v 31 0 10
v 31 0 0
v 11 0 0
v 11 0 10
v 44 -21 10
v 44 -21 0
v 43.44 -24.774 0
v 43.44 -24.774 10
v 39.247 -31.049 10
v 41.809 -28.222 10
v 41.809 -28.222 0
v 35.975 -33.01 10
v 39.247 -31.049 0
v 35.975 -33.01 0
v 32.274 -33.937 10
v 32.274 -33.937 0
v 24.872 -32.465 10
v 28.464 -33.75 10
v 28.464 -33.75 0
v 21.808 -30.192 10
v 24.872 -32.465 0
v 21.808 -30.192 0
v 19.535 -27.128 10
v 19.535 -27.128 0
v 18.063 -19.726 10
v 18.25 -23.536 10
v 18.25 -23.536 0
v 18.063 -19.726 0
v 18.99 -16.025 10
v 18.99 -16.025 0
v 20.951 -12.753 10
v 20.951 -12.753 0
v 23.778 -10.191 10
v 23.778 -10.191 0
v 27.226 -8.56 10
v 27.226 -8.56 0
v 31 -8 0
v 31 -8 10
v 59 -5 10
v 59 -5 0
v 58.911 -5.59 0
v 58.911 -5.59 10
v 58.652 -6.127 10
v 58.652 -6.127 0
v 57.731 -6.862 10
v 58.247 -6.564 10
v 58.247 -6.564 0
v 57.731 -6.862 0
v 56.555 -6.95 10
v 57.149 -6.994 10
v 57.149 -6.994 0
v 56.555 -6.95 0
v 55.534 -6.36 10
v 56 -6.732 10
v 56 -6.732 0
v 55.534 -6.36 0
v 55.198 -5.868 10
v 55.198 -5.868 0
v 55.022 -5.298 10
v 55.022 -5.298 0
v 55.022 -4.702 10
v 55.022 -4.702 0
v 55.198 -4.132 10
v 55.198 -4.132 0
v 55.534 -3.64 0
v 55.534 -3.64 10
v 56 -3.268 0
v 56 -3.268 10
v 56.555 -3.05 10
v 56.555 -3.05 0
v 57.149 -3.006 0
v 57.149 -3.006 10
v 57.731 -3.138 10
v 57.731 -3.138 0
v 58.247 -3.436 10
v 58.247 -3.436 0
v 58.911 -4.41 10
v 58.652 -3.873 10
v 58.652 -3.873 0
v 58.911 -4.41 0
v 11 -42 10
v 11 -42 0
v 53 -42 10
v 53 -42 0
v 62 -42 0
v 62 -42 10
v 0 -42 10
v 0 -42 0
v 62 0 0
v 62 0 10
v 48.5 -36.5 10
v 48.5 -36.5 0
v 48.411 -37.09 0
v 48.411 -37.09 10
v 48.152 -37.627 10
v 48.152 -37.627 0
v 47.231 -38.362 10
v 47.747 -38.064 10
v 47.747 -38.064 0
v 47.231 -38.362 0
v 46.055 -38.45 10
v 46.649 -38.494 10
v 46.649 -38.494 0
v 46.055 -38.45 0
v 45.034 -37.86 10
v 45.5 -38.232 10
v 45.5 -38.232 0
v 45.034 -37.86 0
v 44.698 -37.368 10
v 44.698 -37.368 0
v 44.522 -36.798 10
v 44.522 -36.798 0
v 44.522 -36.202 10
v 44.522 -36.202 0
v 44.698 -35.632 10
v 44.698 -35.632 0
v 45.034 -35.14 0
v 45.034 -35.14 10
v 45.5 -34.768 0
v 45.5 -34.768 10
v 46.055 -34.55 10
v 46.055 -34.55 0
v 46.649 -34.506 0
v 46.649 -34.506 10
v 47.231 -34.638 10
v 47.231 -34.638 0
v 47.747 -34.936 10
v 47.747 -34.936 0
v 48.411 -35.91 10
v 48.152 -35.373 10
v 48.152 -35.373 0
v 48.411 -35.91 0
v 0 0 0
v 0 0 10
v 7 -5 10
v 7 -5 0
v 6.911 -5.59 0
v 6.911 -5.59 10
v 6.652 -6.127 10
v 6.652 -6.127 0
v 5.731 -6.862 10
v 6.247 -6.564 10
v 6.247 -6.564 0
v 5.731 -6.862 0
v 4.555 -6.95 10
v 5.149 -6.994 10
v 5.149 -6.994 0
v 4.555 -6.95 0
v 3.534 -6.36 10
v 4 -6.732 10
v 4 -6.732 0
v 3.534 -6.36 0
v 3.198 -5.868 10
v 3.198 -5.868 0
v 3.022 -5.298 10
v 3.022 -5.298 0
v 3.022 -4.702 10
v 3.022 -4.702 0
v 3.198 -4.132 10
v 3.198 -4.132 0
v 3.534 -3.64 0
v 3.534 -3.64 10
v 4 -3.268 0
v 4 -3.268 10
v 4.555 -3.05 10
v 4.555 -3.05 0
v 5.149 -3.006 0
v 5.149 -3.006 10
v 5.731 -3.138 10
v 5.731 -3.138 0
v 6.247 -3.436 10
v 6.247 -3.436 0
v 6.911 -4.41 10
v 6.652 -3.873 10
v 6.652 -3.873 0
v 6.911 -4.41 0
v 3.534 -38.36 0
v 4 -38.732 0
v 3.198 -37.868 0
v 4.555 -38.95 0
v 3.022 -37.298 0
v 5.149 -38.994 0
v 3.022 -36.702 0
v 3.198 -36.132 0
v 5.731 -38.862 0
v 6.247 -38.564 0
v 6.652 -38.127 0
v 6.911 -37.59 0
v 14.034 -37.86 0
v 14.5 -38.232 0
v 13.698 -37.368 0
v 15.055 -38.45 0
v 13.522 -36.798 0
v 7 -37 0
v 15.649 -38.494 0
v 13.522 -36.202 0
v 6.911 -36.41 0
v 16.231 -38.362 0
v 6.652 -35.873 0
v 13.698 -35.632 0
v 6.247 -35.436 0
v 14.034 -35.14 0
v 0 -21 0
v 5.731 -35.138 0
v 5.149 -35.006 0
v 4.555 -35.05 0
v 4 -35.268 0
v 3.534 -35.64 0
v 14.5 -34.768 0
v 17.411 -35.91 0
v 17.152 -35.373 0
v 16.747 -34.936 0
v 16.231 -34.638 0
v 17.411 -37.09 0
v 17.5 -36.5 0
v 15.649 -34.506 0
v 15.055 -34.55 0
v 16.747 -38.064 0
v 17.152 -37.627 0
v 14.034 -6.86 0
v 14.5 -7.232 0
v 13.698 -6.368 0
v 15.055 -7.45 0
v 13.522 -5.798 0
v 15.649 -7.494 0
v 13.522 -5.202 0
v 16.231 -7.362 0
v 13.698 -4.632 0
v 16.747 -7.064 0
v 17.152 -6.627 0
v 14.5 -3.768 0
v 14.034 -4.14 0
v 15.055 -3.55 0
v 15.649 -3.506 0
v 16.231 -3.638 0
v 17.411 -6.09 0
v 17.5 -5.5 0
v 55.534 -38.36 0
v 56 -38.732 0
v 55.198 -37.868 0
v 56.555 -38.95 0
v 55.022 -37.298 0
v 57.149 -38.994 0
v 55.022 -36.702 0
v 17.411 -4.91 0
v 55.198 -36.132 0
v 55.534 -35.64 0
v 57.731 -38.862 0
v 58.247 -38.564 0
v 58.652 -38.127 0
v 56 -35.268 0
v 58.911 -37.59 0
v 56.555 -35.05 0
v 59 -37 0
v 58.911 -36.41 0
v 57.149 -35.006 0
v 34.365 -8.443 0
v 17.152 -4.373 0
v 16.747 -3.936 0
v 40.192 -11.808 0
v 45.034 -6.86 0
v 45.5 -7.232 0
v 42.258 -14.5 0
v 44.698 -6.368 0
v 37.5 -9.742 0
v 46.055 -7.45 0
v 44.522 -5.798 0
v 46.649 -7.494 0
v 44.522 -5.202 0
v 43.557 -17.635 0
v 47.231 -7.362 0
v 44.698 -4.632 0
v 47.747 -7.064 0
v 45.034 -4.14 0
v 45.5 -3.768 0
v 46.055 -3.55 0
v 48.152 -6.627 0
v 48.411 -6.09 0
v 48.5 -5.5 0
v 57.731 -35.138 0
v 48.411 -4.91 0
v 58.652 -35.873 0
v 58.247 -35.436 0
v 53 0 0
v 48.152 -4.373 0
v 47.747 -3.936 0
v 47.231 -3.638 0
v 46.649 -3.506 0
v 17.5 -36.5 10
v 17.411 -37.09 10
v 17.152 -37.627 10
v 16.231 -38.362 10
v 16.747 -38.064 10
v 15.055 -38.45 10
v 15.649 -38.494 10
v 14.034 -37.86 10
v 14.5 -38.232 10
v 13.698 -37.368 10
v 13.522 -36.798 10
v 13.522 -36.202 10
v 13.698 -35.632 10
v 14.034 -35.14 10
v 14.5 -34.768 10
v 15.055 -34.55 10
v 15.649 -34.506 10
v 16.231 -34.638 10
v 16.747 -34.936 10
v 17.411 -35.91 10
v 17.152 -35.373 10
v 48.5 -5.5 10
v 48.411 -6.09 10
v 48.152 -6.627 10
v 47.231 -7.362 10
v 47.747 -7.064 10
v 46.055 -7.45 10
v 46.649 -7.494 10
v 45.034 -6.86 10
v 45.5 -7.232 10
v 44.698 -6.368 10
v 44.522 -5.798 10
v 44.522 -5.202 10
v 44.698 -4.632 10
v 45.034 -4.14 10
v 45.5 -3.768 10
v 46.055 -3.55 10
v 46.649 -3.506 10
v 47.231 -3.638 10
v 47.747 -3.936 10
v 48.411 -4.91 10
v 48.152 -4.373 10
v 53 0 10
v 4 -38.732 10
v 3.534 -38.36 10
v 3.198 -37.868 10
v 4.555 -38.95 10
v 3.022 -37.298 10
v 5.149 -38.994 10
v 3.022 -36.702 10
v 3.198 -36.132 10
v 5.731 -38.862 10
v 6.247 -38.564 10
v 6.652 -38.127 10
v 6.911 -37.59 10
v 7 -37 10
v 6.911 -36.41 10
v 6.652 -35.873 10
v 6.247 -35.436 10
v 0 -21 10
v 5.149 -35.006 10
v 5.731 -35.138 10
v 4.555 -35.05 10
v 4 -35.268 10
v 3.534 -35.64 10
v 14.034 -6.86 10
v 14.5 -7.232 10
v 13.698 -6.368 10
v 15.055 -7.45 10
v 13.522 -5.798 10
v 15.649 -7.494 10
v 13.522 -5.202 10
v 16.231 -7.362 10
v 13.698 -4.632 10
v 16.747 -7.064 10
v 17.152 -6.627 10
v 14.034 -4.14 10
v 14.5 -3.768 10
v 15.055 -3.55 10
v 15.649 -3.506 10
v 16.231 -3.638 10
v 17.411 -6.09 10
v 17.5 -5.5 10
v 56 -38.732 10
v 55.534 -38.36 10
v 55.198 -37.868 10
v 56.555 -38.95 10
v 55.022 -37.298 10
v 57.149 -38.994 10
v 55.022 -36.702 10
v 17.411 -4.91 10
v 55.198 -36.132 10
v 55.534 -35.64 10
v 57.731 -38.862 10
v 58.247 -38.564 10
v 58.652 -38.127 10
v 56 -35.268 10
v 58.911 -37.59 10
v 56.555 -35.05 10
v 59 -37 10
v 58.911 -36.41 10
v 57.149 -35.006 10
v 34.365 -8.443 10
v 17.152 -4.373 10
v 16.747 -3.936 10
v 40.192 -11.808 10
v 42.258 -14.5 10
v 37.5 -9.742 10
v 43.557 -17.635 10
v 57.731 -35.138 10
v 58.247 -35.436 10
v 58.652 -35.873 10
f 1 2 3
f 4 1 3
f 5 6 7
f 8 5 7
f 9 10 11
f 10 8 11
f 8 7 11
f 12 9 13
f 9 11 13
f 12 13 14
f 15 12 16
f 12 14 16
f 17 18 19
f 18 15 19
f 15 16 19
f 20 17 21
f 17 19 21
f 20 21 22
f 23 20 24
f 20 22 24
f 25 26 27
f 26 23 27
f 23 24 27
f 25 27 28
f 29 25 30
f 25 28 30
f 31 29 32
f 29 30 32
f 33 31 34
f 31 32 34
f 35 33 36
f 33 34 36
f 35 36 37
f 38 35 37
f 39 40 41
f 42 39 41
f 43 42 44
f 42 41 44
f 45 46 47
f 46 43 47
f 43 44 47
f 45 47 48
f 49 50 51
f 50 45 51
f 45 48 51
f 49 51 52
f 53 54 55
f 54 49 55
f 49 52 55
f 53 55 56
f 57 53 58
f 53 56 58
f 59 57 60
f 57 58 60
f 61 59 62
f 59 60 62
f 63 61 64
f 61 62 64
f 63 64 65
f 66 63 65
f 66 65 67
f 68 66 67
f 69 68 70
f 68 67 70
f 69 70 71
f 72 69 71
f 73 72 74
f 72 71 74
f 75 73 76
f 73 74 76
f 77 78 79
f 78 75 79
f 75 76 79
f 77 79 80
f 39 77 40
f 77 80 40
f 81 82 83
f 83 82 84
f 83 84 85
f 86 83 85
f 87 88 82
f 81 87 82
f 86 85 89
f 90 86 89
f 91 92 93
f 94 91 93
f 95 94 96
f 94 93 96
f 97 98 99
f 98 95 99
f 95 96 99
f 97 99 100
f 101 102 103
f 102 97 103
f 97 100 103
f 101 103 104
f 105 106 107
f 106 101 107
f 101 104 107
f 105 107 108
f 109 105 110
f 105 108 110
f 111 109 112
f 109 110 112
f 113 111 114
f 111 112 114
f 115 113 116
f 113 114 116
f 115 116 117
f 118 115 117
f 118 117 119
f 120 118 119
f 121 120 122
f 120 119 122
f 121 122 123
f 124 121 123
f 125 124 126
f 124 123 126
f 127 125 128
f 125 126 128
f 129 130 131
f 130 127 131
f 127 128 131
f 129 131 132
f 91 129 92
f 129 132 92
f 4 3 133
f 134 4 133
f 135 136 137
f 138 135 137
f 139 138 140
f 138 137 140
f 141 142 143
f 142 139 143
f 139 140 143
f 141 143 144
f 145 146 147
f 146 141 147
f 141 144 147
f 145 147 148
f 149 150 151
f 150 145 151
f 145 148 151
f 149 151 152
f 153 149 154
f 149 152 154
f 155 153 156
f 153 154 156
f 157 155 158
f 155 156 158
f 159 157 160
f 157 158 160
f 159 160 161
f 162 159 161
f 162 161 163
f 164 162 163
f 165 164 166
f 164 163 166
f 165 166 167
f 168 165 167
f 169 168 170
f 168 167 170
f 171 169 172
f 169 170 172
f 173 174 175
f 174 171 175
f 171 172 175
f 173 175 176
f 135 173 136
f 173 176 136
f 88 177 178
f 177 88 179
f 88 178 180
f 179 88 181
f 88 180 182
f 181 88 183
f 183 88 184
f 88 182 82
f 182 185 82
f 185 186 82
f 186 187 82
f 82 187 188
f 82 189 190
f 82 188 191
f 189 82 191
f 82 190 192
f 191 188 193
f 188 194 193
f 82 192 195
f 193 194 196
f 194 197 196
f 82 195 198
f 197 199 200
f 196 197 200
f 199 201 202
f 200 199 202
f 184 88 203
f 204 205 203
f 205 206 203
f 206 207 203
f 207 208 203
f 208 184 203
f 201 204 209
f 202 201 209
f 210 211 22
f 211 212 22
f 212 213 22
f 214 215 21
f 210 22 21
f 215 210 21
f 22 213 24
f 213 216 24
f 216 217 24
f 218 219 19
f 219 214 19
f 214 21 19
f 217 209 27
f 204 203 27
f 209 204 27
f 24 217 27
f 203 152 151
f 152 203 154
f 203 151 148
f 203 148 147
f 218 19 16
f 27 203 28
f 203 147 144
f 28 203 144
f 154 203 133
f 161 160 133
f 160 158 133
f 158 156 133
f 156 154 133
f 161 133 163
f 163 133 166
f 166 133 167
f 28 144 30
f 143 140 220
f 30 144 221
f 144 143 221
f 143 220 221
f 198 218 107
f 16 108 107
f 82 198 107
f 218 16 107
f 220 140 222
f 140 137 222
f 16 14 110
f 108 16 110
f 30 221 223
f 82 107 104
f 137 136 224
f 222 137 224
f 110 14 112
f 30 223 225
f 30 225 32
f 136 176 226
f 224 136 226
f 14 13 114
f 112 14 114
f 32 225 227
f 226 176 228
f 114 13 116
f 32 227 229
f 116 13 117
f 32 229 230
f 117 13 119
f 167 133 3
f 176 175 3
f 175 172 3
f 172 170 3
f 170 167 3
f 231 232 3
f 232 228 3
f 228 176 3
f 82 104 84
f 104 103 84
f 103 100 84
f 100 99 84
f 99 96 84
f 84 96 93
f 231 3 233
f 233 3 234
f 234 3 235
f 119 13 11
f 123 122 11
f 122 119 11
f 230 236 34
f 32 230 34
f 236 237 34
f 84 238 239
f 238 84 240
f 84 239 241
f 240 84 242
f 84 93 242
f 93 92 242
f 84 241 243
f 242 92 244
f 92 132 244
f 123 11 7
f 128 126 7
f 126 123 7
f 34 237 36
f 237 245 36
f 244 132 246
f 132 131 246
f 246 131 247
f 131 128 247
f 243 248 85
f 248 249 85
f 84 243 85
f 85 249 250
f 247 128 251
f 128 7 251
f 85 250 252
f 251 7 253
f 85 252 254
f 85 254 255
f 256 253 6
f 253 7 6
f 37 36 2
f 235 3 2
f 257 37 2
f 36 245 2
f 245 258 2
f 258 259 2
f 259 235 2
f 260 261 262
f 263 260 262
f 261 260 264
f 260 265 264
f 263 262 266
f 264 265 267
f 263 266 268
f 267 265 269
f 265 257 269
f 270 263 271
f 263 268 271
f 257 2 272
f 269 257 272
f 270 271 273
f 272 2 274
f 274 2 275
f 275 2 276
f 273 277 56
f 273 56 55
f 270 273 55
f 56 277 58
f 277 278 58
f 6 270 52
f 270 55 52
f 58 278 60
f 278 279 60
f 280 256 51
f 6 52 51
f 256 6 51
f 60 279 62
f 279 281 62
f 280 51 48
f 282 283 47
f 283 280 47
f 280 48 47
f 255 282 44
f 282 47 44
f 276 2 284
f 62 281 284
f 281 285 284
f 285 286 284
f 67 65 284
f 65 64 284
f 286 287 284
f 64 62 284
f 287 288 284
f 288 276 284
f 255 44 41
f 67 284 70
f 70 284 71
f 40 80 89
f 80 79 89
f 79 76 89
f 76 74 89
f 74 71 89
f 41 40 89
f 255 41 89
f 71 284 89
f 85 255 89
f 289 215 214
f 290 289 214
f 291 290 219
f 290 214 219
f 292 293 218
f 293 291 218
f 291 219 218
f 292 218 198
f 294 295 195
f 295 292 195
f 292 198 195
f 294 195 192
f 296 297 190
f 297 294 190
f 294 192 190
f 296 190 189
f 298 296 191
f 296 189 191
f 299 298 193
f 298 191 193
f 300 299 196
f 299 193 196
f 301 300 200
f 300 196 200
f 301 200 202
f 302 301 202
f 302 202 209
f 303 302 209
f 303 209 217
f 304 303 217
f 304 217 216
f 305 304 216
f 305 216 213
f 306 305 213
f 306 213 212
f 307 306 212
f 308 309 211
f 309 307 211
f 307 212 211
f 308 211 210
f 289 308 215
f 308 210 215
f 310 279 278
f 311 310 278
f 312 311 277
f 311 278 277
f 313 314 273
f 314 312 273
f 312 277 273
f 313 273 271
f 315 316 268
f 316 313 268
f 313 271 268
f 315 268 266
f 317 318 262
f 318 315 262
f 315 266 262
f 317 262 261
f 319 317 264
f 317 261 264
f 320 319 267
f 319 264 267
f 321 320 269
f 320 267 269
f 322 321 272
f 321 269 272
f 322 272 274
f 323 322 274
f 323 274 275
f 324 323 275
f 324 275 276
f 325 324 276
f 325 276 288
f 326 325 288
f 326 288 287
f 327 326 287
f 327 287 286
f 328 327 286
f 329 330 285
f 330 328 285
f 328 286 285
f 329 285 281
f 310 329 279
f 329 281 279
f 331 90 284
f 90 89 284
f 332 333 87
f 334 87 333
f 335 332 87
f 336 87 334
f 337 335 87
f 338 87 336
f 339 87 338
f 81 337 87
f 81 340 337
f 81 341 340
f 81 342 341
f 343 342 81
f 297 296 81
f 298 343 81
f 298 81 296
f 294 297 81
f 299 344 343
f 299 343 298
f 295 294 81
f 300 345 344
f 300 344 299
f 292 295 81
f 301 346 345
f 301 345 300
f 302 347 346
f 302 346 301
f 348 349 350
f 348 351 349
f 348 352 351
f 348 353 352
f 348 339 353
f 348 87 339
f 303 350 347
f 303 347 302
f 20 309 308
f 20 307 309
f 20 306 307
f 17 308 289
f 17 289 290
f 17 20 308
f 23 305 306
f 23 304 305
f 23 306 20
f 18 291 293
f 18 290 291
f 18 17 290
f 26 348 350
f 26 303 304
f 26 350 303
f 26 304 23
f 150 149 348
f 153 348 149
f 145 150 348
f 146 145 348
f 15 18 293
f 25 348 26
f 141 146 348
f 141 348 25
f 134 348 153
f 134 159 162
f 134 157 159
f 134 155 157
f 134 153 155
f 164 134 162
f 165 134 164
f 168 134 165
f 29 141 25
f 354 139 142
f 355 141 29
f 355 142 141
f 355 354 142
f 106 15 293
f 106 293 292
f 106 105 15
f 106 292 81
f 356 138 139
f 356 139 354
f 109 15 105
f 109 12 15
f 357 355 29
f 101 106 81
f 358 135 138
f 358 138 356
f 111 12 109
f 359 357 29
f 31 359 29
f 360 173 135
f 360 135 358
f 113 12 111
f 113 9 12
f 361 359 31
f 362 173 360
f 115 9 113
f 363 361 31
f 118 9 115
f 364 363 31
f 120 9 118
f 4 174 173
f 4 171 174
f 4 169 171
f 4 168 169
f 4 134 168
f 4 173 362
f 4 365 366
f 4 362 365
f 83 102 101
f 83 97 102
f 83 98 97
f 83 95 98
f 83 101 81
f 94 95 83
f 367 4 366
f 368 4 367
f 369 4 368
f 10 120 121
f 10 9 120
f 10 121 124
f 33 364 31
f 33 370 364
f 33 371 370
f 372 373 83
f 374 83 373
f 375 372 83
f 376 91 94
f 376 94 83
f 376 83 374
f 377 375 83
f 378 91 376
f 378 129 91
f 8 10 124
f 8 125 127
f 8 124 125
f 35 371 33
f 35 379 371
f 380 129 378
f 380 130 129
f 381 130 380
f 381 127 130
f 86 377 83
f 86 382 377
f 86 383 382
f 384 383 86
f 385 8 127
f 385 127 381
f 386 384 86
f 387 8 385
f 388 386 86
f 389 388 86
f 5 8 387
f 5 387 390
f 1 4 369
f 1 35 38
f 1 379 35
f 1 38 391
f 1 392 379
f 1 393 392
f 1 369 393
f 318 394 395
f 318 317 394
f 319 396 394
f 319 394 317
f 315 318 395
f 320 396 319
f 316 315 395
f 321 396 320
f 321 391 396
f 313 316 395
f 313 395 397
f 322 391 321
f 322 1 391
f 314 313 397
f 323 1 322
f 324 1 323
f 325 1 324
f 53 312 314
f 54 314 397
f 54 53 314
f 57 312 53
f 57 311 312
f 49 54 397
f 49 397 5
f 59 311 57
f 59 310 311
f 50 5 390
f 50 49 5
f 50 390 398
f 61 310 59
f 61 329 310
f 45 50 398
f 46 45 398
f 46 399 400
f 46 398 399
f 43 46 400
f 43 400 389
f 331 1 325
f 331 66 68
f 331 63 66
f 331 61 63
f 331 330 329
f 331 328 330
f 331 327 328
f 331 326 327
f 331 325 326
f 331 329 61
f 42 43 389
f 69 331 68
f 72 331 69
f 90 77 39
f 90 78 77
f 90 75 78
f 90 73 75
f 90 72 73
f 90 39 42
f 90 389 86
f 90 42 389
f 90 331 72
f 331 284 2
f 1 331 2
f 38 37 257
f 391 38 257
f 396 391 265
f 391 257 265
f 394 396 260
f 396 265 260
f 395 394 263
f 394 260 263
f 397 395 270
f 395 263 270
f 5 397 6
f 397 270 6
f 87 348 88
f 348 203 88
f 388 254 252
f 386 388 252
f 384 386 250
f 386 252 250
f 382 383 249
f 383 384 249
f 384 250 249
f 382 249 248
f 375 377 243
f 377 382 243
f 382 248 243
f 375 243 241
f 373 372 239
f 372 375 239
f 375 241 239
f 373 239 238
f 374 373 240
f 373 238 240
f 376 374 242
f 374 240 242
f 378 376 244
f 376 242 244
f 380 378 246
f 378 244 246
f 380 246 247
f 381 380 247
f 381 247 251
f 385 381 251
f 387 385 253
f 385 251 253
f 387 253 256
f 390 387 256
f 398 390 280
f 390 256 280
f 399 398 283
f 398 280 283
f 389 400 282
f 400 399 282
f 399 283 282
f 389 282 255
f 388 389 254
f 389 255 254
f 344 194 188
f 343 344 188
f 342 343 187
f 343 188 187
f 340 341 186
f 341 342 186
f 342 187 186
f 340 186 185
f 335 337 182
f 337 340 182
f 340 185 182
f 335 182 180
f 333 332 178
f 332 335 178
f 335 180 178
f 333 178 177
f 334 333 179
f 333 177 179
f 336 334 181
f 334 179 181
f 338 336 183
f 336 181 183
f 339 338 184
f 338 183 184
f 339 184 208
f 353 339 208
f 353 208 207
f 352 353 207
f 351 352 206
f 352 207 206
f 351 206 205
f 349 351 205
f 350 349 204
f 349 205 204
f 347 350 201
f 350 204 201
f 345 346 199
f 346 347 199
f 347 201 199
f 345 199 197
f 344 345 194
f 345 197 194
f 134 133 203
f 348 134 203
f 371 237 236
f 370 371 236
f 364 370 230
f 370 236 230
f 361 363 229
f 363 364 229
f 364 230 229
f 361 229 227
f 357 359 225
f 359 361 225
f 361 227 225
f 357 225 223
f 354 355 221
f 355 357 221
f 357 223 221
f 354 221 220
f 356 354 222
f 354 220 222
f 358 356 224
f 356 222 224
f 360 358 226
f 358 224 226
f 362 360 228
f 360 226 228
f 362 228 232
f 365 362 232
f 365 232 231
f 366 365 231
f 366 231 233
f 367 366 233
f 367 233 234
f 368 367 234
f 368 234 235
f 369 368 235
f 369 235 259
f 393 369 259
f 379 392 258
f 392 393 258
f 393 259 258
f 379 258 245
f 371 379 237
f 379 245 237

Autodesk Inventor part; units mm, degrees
ref_plane "YZ Plane" through (0, 0, 0) normal (1, 0, 0) x (0, 1, 0)
ref_plane "XZ Plane" through (0, 0, 0) normal (0, 1, 0) x (-1, 0, 0)
ref_plane "XY Plane" through (0, 0, 0) normal (0, 0, 1) x (1, 0, 0)
sketch "Sketch1" plane through (0, 0, 0) normal (0, 0, 1) x (1, 0, 0)
  line L0 (0, 0) -> (0, -42)
  line L1 (0, -42) -> (62, -42)
  line L2 (62, -42) -> (62, 0)
  line L3 (62, 0) -> (0, 0)
  line L4 (11, -42) -> (53, -42)
  line L5 (53, 0) -> (11, 0)
  line L6 (10, -5.9896) -> (10, -30.0104)
  line L7 (31, 0) -> (31, -13)
  circle A0 centre (5, -5) radius 2
  line L8 (0, -21) -> (-21.0238, -21)
  circle A1 centre (31, -21) radius 13
  circle A2 centre (15.5, -5.5) radius 2
  circle A3 centre (15.5, -36.5) radius 2
  circle A4 centre (5, -37) radius 2
  line L9 (52, -5.9896) -> (52, -30.0104)
  circle A5 centre (57, -5) radius 2
  circle A6 centre (46.5, -5.5) radius 2
  circle A7 centre (46.5, -36.5) radius 2
  circle A8 centre (57, -37) radius 2
  dimension "d0" = 42
  dimension "d1" = 62
  dimension "d42" = 10
  dimension "d43" = 4
  dimension "d44" = 5
  dimension "d45" = 5
  dimension "d46" = 26
  dimension "d47" = 4
  dimension "d50" = 4
  dimension "d51" = 5.5
  dimension "d52" = 5.5
  dimension "d53" = 5.5
  dimension "d54" = 31
extrude "Extrusion4" add sketch "Sketch1" along normal blind 10
thread "Rosca1" size "M4x0.7" class "6H" standard "ISO Metric profile" length 430
thread "Rosca2" size "M4x0.7" class "6H" standard "ISO Metric profile" length 430
thread "Rosca3" size "M4x0.7" class "6H" standard "ISO Metric profile" length 430
thread "Rosca4" size "M4x0.7" class "6H" standard "ISO Metric profile" length 430
properties part number "Techo Espaciador Sub. Inferior" material "Aluminum 6061"
